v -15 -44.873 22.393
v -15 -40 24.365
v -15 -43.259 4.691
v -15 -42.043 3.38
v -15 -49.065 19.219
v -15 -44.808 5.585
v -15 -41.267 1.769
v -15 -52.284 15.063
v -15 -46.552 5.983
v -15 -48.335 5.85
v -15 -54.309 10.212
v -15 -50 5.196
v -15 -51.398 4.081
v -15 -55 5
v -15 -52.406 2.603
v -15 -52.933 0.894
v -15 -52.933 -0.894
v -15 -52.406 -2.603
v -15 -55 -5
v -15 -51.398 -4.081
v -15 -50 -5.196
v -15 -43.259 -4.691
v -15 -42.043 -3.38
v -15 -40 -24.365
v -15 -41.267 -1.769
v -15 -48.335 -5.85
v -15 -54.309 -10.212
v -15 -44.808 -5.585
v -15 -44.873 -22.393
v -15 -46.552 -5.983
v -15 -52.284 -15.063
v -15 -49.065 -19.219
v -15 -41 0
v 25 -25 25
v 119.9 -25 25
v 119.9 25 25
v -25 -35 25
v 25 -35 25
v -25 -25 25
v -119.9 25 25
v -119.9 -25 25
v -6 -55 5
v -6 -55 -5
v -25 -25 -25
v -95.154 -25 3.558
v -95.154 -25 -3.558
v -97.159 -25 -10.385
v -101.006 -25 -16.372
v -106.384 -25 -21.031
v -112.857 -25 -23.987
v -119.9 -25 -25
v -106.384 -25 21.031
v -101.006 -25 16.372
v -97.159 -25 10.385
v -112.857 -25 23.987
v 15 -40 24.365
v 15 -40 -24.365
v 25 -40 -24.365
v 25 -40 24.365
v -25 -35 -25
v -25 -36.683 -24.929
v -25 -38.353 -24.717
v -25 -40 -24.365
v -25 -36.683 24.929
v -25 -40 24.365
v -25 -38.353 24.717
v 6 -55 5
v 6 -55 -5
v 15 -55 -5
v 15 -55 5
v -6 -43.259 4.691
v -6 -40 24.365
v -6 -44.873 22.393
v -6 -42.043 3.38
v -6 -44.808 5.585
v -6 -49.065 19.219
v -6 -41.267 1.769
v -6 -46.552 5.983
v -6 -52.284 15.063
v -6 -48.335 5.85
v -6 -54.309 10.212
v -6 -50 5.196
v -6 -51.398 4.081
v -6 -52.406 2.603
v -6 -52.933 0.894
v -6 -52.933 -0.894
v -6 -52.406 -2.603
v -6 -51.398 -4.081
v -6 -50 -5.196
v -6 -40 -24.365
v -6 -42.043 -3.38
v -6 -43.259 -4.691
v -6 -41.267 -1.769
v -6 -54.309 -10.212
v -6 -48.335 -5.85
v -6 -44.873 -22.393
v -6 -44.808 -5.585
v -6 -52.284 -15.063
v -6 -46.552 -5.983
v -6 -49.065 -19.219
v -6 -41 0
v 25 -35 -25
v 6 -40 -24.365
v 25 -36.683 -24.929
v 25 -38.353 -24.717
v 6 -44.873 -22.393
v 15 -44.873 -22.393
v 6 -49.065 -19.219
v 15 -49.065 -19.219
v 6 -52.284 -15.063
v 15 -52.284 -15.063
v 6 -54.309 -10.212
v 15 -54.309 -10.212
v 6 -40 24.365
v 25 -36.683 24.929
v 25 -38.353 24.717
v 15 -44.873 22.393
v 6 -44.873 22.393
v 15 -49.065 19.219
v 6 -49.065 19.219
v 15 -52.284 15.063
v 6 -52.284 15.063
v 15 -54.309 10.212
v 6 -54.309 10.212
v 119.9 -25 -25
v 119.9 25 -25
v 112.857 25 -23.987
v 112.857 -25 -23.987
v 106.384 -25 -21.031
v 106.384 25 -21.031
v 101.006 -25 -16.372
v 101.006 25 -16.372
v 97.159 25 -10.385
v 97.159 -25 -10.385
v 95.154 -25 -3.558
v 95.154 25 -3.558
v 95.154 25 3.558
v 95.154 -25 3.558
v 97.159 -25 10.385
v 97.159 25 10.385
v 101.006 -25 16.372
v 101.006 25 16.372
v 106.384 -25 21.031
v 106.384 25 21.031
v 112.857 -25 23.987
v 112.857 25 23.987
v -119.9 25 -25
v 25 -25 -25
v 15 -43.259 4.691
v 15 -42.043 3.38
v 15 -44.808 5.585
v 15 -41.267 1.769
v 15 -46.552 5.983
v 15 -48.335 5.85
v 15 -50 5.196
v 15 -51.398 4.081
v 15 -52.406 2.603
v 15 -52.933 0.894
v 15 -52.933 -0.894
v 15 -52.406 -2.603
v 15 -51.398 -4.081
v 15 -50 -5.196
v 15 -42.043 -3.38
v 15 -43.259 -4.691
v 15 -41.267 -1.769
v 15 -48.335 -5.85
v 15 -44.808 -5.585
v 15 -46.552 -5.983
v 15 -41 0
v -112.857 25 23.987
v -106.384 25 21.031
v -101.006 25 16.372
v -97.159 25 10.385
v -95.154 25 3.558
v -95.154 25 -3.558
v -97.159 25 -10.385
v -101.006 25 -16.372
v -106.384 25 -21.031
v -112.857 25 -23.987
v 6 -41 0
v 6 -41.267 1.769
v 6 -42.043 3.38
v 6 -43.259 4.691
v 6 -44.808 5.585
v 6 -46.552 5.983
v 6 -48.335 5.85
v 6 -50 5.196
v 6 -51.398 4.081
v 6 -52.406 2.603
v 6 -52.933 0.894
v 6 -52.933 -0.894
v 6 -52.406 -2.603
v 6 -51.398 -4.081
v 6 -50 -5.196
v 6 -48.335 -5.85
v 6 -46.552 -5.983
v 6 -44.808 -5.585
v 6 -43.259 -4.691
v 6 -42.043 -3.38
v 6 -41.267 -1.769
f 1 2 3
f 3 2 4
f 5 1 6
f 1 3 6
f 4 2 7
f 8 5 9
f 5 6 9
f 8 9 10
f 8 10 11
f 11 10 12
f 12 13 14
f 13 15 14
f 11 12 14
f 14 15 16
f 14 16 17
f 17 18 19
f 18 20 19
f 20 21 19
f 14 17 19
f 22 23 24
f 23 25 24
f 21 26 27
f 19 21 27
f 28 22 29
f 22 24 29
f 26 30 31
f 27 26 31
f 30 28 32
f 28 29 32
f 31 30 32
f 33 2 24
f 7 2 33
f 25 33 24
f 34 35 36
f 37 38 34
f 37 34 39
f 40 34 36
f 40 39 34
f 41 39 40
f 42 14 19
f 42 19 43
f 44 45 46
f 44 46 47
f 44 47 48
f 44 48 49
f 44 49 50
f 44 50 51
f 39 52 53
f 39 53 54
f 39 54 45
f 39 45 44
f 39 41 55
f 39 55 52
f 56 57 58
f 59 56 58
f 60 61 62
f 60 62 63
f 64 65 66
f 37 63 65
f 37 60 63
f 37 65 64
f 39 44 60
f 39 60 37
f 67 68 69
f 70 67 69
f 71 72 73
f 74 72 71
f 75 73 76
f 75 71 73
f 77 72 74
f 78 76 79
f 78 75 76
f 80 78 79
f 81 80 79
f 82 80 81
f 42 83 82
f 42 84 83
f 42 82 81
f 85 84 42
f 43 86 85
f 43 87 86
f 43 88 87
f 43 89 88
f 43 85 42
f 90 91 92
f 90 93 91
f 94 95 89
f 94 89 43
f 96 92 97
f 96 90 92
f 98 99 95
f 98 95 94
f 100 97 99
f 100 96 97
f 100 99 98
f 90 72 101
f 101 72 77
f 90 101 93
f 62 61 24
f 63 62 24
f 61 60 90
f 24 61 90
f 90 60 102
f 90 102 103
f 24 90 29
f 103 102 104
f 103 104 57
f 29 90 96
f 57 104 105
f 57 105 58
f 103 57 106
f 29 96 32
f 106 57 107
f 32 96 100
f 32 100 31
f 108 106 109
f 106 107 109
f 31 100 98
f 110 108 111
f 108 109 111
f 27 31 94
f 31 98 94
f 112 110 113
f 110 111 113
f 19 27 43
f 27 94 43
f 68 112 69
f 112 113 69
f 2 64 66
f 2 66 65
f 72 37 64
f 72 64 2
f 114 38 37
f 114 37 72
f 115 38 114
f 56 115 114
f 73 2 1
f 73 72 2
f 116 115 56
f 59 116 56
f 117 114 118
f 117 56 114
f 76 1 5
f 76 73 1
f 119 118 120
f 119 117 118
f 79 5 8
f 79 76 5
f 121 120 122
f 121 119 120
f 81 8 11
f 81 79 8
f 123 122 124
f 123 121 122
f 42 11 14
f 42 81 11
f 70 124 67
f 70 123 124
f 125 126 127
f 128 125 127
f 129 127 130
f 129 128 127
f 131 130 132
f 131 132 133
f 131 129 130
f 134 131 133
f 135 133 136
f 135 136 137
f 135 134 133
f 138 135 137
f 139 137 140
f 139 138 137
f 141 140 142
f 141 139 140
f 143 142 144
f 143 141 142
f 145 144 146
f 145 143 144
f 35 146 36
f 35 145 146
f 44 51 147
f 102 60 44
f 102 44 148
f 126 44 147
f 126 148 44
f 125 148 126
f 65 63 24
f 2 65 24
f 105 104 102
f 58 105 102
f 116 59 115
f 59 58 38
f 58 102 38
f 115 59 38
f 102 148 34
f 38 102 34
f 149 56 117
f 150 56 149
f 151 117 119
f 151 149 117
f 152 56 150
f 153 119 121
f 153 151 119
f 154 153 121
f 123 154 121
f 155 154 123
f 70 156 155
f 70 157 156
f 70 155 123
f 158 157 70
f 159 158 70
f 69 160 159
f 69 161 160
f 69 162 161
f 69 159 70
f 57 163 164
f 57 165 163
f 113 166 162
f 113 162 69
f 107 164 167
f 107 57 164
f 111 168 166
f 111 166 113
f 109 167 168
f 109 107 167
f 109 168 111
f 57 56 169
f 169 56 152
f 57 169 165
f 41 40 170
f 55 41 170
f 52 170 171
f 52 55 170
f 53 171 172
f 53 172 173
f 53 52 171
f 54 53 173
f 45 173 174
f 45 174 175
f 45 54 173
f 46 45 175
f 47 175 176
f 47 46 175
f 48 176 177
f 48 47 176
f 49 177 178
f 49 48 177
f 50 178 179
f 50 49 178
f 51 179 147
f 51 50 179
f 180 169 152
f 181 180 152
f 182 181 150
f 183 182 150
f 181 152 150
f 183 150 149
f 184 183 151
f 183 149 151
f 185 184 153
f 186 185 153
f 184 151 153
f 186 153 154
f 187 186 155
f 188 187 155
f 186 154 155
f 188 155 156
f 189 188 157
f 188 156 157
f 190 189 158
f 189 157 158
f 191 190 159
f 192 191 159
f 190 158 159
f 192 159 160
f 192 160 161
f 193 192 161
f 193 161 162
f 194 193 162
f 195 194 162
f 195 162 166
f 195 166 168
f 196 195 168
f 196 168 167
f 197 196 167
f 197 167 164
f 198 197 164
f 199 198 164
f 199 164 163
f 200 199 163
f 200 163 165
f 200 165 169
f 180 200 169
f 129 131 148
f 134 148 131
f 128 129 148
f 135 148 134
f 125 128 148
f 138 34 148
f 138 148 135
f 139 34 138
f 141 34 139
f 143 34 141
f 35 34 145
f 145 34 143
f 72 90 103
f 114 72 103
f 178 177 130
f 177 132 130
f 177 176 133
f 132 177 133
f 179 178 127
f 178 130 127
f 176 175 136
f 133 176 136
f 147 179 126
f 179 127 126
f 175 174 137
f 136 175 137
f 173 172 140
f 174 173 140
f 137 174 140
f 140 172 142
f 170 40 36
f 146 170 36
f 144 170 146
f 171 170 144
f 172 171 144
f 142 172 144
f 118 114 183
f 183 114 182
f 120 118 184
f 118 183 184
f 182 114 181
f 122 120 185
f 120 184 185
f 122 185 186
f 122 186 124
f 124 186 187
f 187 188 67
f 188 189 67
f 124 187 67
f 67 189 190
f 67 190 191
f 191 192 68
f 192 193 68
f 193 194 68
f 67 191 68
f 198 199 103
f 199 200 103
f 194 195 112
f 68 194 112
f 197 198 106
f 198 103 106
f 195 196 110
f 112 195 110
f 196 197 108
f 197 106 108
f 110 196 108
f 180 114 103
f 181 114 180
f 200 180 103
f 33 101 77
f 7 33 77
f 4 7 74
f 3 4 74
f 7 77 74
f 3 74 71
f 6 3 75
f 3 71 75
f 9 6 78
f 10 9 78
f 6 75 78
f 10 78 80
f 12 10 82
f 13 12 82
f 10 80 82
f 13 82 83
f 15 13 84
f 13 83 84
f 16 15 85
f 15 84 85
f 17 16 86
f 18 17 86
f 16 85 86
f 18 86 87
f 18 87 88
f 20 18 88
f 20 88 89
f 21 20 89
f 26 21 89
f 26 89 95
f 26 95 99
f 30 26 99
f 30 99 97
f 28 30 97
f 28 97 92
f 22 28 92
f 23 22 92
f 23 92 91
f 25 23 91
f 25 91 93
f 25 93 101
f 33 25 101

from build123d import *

# Parameters (mm, degrees)
F1_DEPTH  = 25
F2_W      = 50
F2_H      = 50
F3_DEPTH  = 30
F6_W      = 6
F6_H      = 15
F5_W      = 6
F5_H      = 15
F4_W      = 10
F4_H      = 15
F7_DEPTH  = 50.001
F8_F1_R   = 20
F8_F2_R   = 20
F9_R      = 6
F10_DEPTH = 134.901


with BuildPart() as f1:
    # F0 (on Front) → F1 (new body, symmetric)
    with BuildSketch(Plane.XZ):
        with BuildLine():
            Line((-119.9, -25), (119.9, -25))
            ThreePointArc((119.9, -25), (94.9, 0), (119.9, 25))
            Line((119.9, 25), (-119.9, 25))
            ThreePointArc((-119.9, 25), (-94.9, 0), (-119.9, -25))
        make_face()
    extrude(amount=F1_DEPTH, both=True)

    # F2 (on face) → F3 (join)
    with BuildSketch(Plane.XZ.offset(25)):
        Rectangle(F2_W, F2_H)
    extrude(amount=F3_DEPTH)

    # F6 (on face) + F5 (on face) + F4 (on face) → F7 (cut, through all)
    with BuildSketch(Plane(origin=(0, 0, -25), x_dir=(1, 0, 0), z_dir=(0, 0, -1))):
        with Locations((-3, 47.5)):
            Rectangle(F6_W, F6_H)
    with BuildSketch(Plane(origin=(0, 0, -25), x_dir=(1, 0, 0), z_dir=(0, 0, -1))):
        with Locations((3, 47.5)):
            Rectangle(F5_W, F5_H)
    with BuildSketch(Plane(origin=(0, 0, -25), x_dir=(1, 0, 0), z_dir=(0, 0, -1))):
        with Locations((20, 47.5)):
            Rectangle(F4_W, F4_H)
        with Locations((-20, 47.5)):
            Rectangle(F4_W, F4_H)
    extrude(amount=-F7_DEPTH, mode=Mode.SUBTRACT)

    # F8: fillet of radius 20 on 4 edges, made by hand

    # F8_f1
    f8_f1_edges = [f1.edges().sort_by_distance(p)[0] for p in [
        (10.5, -55, 25),
    ]]
    fillet(f8_f1_edges, radius=F8_F1_R)

    # F8_f2
    f8_f2_edges = [f1.edges().sort_by_distance(p)[0] for p in [
        (10.5, -55, -25),
    ]]
    fillet(f8_f2_edges, radius=F8_F2_R)

    # F9 (on face) → F10 (cut, through all)
    with BuildSketch(Plane.YZ.offset(15)):
        with Locations((-47, 0)):
            Circle(F9_R)
    extrude(amount=-F10_DEPTH, mode=Mode.SUBTRACT)


solid = f1.part
